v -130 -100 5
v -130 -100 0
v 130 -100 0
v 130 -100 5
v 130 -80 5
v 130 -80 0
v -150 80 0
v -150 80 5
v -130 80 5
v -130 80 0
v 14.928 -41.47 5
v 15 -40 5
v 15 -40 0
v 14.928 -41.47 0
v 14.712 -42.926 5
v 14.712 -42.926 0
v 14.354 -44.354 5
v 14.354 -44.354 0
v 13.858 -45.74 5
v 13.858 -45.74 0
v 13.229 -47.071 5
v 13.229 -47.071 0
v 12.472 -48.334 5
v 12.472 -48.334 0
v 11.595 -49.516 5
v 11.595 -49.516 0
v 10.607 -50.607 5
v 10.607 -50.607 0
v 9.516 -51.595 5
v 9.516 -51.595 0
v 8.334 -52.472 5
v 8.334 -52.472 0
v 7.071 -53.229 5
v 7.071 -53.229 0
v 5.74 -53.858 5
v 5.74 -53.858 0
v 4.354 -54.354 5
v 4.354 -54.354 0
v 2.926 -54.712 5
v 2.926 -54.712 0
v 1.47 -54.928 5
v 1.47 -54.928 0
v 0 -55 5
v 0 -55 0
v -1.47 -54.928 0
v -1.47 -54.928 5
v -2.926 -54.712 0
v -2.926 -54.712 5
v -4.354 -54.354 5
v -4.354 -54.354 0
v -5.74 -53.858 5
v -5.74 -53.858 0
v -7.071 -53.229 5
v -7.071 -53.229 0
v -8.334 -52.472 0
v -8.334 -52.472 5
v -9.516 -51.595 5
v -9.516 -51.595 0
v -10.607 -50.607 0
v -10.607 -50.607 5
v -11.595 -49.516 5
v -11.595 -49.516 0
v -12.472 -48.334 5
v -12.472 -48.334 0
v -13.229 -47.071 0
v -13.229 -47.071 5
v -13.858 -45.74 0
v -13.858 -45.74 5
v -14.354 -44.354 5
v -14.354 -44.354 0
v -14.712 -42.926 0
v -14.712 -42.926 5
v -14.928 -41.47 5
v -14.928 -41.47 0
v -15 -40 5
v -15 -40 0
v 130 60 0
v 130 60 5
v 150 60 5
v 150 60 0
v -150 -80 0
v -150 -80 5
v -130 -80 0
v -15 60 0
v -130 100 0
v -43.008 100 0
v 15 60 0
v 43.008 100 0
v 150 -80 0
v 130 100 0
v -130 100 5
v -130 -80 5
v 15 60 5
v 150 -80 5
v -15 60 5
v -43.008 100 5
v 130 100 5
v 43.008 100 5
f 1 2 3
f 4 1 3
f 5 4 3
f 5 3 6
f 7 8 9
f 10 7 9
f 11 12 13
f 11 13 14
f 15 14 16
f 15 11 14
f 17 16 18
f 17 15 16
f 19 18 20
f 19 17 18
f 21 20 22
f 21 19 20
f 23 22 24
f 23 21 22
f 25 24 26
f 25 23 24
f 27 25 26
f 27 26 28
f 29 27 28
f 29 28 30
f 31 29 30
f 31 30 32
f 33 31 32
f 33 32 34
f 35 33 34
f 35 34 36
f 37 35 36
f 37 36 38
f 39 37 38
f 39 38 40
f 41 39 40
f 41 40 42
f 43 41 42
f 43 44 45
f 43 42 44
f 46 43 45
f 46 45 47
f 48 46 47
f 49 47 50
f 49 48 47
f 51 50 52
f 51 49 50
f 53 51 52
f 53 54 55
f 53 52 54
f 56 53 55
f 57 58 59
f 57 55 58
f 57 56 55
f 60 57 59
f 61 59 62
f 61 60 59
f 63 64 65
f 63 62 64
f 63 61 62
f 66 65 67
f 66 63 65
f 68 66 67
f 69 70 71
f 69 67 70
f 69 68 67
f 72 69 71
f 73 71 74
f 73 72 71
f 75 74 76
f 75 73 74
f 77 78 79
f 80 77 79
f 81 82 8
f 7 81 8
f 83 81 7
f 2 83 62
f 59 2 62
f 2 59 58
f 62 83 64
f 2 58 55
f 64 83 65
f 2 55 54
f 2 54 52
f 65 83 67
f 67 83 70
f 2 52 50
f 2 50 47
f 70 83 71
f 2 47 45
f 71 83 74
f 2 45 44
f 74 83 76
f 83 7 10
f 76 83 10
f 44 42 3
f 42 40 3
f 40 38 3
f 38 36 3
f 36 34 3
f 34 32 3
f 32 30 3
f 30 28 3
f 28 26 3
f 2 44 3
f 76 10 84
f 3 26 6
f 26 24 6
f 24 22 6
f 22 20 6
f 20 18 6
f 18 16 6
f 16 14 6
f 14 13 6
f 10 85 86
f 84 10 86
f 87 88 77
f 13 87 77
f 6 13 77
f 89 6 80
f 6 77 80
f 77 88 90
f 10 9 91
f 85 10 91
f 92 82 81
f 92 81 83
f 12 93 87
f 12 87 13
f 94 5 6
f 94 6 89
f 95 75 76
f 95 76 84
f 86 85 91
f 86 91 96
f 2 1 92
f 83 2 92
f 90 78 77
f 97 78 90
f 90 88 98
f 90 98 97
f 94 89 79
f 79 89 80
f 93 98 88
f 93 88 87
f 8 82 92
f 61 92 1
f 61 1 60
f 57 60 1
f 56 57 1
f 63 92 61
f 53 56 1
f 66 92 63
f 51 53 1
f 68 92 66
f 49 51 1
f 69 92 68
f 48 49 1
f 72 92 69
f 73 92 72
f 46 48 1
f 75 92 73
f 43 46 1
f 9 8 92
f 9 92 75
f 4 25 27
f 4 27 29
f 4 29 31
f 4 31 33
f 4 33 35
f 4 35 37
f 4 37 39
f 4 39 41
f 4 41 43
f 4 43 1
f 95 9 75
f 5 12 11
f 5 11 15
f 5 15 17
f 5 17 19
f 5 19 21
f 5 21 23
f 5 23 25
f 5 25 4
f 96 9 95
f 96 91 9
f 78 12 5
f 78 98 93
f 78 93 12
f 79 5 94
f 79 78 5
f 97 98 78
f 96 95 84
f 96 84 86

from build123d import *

# Parameters (mm, degrees)
SKETCH1_W           = 300
SKETCH1_H           = 200
BOSS_EXTRUDE1_DEPTH = 5
SKETCH3_W           = 20
SKETCH3_H           = 20
SKETCH3_H_2         = 40
CUT_EXTRUDE1_DEPTH  = 5
CUT_EXTRUDE2_DEPTH  = 10
SKETCH5_W           = 20
SKETCH5_H           = 20
BOSS_EXTRUDE2_DEPTH = 5


with BuildPart() as part:
    # Sketch1 → Boss-Extrude1 (new body)
    with BuildSketch(Plane.XY):
        Rectangle(SKETCH1_W, SKETCH1_H)
    extrude(amount=BOSS_EXTRUDE1_DEPTH)

    # Sketch3 → Cut-Extrude1 (cut)
    with BuildSketch(Plane.XY.offset(5)):
        with Locations((-140, -90)):
            Rectangle(SKETCH3_W, SKETCH3_H)
        with Locations((-140, 80)):
            Rectangle(SKETCH3_W, SKETCH3_H_2)
        with Locations((140, 80)):
            Rectangle(SKETCH3_W, SKETCH3_H_2)
        with Locations((140, -90)):
            Rectangle(SKETCH3_W, SKETCH3_H)
    extrude(amount=-CUT_EXTRUDE1_DEPTH, mode=Mode.SUBTRACT)

    # Sketch4 → Cut-Extrude2 (cut)
    with BuildSketch(Plane.XY.offset(5)):
        with BuildLine():
            Line((-15, -40), (-15, 60))
            Line((-15, 60), (-43.008301528, 100))
            Line((-43.008301528, 100), (43.008301528, 100))
            Line((43.008301528, 100), (15, 60))
            Line((15, 60), (15, -40))
            ThreePointArc((15, -40), (0, -55), (-15, -40))
        make_face()
    extrude(amount=-CUT_EXTRUDE2_DEPTH, mode=Mode.SUBTRACT)

    # Sketch5 → Boss-Extrude2 (add)
    with BuildSketch(Plane.XY.offset(5)):
        with Locations((-140, 70)):
            Rectangle(SKETCH5_W, SKETCH5_H)
    extrude(amount=-BOSS_EXTRUDE2_DEPTH)


solid = part.part
